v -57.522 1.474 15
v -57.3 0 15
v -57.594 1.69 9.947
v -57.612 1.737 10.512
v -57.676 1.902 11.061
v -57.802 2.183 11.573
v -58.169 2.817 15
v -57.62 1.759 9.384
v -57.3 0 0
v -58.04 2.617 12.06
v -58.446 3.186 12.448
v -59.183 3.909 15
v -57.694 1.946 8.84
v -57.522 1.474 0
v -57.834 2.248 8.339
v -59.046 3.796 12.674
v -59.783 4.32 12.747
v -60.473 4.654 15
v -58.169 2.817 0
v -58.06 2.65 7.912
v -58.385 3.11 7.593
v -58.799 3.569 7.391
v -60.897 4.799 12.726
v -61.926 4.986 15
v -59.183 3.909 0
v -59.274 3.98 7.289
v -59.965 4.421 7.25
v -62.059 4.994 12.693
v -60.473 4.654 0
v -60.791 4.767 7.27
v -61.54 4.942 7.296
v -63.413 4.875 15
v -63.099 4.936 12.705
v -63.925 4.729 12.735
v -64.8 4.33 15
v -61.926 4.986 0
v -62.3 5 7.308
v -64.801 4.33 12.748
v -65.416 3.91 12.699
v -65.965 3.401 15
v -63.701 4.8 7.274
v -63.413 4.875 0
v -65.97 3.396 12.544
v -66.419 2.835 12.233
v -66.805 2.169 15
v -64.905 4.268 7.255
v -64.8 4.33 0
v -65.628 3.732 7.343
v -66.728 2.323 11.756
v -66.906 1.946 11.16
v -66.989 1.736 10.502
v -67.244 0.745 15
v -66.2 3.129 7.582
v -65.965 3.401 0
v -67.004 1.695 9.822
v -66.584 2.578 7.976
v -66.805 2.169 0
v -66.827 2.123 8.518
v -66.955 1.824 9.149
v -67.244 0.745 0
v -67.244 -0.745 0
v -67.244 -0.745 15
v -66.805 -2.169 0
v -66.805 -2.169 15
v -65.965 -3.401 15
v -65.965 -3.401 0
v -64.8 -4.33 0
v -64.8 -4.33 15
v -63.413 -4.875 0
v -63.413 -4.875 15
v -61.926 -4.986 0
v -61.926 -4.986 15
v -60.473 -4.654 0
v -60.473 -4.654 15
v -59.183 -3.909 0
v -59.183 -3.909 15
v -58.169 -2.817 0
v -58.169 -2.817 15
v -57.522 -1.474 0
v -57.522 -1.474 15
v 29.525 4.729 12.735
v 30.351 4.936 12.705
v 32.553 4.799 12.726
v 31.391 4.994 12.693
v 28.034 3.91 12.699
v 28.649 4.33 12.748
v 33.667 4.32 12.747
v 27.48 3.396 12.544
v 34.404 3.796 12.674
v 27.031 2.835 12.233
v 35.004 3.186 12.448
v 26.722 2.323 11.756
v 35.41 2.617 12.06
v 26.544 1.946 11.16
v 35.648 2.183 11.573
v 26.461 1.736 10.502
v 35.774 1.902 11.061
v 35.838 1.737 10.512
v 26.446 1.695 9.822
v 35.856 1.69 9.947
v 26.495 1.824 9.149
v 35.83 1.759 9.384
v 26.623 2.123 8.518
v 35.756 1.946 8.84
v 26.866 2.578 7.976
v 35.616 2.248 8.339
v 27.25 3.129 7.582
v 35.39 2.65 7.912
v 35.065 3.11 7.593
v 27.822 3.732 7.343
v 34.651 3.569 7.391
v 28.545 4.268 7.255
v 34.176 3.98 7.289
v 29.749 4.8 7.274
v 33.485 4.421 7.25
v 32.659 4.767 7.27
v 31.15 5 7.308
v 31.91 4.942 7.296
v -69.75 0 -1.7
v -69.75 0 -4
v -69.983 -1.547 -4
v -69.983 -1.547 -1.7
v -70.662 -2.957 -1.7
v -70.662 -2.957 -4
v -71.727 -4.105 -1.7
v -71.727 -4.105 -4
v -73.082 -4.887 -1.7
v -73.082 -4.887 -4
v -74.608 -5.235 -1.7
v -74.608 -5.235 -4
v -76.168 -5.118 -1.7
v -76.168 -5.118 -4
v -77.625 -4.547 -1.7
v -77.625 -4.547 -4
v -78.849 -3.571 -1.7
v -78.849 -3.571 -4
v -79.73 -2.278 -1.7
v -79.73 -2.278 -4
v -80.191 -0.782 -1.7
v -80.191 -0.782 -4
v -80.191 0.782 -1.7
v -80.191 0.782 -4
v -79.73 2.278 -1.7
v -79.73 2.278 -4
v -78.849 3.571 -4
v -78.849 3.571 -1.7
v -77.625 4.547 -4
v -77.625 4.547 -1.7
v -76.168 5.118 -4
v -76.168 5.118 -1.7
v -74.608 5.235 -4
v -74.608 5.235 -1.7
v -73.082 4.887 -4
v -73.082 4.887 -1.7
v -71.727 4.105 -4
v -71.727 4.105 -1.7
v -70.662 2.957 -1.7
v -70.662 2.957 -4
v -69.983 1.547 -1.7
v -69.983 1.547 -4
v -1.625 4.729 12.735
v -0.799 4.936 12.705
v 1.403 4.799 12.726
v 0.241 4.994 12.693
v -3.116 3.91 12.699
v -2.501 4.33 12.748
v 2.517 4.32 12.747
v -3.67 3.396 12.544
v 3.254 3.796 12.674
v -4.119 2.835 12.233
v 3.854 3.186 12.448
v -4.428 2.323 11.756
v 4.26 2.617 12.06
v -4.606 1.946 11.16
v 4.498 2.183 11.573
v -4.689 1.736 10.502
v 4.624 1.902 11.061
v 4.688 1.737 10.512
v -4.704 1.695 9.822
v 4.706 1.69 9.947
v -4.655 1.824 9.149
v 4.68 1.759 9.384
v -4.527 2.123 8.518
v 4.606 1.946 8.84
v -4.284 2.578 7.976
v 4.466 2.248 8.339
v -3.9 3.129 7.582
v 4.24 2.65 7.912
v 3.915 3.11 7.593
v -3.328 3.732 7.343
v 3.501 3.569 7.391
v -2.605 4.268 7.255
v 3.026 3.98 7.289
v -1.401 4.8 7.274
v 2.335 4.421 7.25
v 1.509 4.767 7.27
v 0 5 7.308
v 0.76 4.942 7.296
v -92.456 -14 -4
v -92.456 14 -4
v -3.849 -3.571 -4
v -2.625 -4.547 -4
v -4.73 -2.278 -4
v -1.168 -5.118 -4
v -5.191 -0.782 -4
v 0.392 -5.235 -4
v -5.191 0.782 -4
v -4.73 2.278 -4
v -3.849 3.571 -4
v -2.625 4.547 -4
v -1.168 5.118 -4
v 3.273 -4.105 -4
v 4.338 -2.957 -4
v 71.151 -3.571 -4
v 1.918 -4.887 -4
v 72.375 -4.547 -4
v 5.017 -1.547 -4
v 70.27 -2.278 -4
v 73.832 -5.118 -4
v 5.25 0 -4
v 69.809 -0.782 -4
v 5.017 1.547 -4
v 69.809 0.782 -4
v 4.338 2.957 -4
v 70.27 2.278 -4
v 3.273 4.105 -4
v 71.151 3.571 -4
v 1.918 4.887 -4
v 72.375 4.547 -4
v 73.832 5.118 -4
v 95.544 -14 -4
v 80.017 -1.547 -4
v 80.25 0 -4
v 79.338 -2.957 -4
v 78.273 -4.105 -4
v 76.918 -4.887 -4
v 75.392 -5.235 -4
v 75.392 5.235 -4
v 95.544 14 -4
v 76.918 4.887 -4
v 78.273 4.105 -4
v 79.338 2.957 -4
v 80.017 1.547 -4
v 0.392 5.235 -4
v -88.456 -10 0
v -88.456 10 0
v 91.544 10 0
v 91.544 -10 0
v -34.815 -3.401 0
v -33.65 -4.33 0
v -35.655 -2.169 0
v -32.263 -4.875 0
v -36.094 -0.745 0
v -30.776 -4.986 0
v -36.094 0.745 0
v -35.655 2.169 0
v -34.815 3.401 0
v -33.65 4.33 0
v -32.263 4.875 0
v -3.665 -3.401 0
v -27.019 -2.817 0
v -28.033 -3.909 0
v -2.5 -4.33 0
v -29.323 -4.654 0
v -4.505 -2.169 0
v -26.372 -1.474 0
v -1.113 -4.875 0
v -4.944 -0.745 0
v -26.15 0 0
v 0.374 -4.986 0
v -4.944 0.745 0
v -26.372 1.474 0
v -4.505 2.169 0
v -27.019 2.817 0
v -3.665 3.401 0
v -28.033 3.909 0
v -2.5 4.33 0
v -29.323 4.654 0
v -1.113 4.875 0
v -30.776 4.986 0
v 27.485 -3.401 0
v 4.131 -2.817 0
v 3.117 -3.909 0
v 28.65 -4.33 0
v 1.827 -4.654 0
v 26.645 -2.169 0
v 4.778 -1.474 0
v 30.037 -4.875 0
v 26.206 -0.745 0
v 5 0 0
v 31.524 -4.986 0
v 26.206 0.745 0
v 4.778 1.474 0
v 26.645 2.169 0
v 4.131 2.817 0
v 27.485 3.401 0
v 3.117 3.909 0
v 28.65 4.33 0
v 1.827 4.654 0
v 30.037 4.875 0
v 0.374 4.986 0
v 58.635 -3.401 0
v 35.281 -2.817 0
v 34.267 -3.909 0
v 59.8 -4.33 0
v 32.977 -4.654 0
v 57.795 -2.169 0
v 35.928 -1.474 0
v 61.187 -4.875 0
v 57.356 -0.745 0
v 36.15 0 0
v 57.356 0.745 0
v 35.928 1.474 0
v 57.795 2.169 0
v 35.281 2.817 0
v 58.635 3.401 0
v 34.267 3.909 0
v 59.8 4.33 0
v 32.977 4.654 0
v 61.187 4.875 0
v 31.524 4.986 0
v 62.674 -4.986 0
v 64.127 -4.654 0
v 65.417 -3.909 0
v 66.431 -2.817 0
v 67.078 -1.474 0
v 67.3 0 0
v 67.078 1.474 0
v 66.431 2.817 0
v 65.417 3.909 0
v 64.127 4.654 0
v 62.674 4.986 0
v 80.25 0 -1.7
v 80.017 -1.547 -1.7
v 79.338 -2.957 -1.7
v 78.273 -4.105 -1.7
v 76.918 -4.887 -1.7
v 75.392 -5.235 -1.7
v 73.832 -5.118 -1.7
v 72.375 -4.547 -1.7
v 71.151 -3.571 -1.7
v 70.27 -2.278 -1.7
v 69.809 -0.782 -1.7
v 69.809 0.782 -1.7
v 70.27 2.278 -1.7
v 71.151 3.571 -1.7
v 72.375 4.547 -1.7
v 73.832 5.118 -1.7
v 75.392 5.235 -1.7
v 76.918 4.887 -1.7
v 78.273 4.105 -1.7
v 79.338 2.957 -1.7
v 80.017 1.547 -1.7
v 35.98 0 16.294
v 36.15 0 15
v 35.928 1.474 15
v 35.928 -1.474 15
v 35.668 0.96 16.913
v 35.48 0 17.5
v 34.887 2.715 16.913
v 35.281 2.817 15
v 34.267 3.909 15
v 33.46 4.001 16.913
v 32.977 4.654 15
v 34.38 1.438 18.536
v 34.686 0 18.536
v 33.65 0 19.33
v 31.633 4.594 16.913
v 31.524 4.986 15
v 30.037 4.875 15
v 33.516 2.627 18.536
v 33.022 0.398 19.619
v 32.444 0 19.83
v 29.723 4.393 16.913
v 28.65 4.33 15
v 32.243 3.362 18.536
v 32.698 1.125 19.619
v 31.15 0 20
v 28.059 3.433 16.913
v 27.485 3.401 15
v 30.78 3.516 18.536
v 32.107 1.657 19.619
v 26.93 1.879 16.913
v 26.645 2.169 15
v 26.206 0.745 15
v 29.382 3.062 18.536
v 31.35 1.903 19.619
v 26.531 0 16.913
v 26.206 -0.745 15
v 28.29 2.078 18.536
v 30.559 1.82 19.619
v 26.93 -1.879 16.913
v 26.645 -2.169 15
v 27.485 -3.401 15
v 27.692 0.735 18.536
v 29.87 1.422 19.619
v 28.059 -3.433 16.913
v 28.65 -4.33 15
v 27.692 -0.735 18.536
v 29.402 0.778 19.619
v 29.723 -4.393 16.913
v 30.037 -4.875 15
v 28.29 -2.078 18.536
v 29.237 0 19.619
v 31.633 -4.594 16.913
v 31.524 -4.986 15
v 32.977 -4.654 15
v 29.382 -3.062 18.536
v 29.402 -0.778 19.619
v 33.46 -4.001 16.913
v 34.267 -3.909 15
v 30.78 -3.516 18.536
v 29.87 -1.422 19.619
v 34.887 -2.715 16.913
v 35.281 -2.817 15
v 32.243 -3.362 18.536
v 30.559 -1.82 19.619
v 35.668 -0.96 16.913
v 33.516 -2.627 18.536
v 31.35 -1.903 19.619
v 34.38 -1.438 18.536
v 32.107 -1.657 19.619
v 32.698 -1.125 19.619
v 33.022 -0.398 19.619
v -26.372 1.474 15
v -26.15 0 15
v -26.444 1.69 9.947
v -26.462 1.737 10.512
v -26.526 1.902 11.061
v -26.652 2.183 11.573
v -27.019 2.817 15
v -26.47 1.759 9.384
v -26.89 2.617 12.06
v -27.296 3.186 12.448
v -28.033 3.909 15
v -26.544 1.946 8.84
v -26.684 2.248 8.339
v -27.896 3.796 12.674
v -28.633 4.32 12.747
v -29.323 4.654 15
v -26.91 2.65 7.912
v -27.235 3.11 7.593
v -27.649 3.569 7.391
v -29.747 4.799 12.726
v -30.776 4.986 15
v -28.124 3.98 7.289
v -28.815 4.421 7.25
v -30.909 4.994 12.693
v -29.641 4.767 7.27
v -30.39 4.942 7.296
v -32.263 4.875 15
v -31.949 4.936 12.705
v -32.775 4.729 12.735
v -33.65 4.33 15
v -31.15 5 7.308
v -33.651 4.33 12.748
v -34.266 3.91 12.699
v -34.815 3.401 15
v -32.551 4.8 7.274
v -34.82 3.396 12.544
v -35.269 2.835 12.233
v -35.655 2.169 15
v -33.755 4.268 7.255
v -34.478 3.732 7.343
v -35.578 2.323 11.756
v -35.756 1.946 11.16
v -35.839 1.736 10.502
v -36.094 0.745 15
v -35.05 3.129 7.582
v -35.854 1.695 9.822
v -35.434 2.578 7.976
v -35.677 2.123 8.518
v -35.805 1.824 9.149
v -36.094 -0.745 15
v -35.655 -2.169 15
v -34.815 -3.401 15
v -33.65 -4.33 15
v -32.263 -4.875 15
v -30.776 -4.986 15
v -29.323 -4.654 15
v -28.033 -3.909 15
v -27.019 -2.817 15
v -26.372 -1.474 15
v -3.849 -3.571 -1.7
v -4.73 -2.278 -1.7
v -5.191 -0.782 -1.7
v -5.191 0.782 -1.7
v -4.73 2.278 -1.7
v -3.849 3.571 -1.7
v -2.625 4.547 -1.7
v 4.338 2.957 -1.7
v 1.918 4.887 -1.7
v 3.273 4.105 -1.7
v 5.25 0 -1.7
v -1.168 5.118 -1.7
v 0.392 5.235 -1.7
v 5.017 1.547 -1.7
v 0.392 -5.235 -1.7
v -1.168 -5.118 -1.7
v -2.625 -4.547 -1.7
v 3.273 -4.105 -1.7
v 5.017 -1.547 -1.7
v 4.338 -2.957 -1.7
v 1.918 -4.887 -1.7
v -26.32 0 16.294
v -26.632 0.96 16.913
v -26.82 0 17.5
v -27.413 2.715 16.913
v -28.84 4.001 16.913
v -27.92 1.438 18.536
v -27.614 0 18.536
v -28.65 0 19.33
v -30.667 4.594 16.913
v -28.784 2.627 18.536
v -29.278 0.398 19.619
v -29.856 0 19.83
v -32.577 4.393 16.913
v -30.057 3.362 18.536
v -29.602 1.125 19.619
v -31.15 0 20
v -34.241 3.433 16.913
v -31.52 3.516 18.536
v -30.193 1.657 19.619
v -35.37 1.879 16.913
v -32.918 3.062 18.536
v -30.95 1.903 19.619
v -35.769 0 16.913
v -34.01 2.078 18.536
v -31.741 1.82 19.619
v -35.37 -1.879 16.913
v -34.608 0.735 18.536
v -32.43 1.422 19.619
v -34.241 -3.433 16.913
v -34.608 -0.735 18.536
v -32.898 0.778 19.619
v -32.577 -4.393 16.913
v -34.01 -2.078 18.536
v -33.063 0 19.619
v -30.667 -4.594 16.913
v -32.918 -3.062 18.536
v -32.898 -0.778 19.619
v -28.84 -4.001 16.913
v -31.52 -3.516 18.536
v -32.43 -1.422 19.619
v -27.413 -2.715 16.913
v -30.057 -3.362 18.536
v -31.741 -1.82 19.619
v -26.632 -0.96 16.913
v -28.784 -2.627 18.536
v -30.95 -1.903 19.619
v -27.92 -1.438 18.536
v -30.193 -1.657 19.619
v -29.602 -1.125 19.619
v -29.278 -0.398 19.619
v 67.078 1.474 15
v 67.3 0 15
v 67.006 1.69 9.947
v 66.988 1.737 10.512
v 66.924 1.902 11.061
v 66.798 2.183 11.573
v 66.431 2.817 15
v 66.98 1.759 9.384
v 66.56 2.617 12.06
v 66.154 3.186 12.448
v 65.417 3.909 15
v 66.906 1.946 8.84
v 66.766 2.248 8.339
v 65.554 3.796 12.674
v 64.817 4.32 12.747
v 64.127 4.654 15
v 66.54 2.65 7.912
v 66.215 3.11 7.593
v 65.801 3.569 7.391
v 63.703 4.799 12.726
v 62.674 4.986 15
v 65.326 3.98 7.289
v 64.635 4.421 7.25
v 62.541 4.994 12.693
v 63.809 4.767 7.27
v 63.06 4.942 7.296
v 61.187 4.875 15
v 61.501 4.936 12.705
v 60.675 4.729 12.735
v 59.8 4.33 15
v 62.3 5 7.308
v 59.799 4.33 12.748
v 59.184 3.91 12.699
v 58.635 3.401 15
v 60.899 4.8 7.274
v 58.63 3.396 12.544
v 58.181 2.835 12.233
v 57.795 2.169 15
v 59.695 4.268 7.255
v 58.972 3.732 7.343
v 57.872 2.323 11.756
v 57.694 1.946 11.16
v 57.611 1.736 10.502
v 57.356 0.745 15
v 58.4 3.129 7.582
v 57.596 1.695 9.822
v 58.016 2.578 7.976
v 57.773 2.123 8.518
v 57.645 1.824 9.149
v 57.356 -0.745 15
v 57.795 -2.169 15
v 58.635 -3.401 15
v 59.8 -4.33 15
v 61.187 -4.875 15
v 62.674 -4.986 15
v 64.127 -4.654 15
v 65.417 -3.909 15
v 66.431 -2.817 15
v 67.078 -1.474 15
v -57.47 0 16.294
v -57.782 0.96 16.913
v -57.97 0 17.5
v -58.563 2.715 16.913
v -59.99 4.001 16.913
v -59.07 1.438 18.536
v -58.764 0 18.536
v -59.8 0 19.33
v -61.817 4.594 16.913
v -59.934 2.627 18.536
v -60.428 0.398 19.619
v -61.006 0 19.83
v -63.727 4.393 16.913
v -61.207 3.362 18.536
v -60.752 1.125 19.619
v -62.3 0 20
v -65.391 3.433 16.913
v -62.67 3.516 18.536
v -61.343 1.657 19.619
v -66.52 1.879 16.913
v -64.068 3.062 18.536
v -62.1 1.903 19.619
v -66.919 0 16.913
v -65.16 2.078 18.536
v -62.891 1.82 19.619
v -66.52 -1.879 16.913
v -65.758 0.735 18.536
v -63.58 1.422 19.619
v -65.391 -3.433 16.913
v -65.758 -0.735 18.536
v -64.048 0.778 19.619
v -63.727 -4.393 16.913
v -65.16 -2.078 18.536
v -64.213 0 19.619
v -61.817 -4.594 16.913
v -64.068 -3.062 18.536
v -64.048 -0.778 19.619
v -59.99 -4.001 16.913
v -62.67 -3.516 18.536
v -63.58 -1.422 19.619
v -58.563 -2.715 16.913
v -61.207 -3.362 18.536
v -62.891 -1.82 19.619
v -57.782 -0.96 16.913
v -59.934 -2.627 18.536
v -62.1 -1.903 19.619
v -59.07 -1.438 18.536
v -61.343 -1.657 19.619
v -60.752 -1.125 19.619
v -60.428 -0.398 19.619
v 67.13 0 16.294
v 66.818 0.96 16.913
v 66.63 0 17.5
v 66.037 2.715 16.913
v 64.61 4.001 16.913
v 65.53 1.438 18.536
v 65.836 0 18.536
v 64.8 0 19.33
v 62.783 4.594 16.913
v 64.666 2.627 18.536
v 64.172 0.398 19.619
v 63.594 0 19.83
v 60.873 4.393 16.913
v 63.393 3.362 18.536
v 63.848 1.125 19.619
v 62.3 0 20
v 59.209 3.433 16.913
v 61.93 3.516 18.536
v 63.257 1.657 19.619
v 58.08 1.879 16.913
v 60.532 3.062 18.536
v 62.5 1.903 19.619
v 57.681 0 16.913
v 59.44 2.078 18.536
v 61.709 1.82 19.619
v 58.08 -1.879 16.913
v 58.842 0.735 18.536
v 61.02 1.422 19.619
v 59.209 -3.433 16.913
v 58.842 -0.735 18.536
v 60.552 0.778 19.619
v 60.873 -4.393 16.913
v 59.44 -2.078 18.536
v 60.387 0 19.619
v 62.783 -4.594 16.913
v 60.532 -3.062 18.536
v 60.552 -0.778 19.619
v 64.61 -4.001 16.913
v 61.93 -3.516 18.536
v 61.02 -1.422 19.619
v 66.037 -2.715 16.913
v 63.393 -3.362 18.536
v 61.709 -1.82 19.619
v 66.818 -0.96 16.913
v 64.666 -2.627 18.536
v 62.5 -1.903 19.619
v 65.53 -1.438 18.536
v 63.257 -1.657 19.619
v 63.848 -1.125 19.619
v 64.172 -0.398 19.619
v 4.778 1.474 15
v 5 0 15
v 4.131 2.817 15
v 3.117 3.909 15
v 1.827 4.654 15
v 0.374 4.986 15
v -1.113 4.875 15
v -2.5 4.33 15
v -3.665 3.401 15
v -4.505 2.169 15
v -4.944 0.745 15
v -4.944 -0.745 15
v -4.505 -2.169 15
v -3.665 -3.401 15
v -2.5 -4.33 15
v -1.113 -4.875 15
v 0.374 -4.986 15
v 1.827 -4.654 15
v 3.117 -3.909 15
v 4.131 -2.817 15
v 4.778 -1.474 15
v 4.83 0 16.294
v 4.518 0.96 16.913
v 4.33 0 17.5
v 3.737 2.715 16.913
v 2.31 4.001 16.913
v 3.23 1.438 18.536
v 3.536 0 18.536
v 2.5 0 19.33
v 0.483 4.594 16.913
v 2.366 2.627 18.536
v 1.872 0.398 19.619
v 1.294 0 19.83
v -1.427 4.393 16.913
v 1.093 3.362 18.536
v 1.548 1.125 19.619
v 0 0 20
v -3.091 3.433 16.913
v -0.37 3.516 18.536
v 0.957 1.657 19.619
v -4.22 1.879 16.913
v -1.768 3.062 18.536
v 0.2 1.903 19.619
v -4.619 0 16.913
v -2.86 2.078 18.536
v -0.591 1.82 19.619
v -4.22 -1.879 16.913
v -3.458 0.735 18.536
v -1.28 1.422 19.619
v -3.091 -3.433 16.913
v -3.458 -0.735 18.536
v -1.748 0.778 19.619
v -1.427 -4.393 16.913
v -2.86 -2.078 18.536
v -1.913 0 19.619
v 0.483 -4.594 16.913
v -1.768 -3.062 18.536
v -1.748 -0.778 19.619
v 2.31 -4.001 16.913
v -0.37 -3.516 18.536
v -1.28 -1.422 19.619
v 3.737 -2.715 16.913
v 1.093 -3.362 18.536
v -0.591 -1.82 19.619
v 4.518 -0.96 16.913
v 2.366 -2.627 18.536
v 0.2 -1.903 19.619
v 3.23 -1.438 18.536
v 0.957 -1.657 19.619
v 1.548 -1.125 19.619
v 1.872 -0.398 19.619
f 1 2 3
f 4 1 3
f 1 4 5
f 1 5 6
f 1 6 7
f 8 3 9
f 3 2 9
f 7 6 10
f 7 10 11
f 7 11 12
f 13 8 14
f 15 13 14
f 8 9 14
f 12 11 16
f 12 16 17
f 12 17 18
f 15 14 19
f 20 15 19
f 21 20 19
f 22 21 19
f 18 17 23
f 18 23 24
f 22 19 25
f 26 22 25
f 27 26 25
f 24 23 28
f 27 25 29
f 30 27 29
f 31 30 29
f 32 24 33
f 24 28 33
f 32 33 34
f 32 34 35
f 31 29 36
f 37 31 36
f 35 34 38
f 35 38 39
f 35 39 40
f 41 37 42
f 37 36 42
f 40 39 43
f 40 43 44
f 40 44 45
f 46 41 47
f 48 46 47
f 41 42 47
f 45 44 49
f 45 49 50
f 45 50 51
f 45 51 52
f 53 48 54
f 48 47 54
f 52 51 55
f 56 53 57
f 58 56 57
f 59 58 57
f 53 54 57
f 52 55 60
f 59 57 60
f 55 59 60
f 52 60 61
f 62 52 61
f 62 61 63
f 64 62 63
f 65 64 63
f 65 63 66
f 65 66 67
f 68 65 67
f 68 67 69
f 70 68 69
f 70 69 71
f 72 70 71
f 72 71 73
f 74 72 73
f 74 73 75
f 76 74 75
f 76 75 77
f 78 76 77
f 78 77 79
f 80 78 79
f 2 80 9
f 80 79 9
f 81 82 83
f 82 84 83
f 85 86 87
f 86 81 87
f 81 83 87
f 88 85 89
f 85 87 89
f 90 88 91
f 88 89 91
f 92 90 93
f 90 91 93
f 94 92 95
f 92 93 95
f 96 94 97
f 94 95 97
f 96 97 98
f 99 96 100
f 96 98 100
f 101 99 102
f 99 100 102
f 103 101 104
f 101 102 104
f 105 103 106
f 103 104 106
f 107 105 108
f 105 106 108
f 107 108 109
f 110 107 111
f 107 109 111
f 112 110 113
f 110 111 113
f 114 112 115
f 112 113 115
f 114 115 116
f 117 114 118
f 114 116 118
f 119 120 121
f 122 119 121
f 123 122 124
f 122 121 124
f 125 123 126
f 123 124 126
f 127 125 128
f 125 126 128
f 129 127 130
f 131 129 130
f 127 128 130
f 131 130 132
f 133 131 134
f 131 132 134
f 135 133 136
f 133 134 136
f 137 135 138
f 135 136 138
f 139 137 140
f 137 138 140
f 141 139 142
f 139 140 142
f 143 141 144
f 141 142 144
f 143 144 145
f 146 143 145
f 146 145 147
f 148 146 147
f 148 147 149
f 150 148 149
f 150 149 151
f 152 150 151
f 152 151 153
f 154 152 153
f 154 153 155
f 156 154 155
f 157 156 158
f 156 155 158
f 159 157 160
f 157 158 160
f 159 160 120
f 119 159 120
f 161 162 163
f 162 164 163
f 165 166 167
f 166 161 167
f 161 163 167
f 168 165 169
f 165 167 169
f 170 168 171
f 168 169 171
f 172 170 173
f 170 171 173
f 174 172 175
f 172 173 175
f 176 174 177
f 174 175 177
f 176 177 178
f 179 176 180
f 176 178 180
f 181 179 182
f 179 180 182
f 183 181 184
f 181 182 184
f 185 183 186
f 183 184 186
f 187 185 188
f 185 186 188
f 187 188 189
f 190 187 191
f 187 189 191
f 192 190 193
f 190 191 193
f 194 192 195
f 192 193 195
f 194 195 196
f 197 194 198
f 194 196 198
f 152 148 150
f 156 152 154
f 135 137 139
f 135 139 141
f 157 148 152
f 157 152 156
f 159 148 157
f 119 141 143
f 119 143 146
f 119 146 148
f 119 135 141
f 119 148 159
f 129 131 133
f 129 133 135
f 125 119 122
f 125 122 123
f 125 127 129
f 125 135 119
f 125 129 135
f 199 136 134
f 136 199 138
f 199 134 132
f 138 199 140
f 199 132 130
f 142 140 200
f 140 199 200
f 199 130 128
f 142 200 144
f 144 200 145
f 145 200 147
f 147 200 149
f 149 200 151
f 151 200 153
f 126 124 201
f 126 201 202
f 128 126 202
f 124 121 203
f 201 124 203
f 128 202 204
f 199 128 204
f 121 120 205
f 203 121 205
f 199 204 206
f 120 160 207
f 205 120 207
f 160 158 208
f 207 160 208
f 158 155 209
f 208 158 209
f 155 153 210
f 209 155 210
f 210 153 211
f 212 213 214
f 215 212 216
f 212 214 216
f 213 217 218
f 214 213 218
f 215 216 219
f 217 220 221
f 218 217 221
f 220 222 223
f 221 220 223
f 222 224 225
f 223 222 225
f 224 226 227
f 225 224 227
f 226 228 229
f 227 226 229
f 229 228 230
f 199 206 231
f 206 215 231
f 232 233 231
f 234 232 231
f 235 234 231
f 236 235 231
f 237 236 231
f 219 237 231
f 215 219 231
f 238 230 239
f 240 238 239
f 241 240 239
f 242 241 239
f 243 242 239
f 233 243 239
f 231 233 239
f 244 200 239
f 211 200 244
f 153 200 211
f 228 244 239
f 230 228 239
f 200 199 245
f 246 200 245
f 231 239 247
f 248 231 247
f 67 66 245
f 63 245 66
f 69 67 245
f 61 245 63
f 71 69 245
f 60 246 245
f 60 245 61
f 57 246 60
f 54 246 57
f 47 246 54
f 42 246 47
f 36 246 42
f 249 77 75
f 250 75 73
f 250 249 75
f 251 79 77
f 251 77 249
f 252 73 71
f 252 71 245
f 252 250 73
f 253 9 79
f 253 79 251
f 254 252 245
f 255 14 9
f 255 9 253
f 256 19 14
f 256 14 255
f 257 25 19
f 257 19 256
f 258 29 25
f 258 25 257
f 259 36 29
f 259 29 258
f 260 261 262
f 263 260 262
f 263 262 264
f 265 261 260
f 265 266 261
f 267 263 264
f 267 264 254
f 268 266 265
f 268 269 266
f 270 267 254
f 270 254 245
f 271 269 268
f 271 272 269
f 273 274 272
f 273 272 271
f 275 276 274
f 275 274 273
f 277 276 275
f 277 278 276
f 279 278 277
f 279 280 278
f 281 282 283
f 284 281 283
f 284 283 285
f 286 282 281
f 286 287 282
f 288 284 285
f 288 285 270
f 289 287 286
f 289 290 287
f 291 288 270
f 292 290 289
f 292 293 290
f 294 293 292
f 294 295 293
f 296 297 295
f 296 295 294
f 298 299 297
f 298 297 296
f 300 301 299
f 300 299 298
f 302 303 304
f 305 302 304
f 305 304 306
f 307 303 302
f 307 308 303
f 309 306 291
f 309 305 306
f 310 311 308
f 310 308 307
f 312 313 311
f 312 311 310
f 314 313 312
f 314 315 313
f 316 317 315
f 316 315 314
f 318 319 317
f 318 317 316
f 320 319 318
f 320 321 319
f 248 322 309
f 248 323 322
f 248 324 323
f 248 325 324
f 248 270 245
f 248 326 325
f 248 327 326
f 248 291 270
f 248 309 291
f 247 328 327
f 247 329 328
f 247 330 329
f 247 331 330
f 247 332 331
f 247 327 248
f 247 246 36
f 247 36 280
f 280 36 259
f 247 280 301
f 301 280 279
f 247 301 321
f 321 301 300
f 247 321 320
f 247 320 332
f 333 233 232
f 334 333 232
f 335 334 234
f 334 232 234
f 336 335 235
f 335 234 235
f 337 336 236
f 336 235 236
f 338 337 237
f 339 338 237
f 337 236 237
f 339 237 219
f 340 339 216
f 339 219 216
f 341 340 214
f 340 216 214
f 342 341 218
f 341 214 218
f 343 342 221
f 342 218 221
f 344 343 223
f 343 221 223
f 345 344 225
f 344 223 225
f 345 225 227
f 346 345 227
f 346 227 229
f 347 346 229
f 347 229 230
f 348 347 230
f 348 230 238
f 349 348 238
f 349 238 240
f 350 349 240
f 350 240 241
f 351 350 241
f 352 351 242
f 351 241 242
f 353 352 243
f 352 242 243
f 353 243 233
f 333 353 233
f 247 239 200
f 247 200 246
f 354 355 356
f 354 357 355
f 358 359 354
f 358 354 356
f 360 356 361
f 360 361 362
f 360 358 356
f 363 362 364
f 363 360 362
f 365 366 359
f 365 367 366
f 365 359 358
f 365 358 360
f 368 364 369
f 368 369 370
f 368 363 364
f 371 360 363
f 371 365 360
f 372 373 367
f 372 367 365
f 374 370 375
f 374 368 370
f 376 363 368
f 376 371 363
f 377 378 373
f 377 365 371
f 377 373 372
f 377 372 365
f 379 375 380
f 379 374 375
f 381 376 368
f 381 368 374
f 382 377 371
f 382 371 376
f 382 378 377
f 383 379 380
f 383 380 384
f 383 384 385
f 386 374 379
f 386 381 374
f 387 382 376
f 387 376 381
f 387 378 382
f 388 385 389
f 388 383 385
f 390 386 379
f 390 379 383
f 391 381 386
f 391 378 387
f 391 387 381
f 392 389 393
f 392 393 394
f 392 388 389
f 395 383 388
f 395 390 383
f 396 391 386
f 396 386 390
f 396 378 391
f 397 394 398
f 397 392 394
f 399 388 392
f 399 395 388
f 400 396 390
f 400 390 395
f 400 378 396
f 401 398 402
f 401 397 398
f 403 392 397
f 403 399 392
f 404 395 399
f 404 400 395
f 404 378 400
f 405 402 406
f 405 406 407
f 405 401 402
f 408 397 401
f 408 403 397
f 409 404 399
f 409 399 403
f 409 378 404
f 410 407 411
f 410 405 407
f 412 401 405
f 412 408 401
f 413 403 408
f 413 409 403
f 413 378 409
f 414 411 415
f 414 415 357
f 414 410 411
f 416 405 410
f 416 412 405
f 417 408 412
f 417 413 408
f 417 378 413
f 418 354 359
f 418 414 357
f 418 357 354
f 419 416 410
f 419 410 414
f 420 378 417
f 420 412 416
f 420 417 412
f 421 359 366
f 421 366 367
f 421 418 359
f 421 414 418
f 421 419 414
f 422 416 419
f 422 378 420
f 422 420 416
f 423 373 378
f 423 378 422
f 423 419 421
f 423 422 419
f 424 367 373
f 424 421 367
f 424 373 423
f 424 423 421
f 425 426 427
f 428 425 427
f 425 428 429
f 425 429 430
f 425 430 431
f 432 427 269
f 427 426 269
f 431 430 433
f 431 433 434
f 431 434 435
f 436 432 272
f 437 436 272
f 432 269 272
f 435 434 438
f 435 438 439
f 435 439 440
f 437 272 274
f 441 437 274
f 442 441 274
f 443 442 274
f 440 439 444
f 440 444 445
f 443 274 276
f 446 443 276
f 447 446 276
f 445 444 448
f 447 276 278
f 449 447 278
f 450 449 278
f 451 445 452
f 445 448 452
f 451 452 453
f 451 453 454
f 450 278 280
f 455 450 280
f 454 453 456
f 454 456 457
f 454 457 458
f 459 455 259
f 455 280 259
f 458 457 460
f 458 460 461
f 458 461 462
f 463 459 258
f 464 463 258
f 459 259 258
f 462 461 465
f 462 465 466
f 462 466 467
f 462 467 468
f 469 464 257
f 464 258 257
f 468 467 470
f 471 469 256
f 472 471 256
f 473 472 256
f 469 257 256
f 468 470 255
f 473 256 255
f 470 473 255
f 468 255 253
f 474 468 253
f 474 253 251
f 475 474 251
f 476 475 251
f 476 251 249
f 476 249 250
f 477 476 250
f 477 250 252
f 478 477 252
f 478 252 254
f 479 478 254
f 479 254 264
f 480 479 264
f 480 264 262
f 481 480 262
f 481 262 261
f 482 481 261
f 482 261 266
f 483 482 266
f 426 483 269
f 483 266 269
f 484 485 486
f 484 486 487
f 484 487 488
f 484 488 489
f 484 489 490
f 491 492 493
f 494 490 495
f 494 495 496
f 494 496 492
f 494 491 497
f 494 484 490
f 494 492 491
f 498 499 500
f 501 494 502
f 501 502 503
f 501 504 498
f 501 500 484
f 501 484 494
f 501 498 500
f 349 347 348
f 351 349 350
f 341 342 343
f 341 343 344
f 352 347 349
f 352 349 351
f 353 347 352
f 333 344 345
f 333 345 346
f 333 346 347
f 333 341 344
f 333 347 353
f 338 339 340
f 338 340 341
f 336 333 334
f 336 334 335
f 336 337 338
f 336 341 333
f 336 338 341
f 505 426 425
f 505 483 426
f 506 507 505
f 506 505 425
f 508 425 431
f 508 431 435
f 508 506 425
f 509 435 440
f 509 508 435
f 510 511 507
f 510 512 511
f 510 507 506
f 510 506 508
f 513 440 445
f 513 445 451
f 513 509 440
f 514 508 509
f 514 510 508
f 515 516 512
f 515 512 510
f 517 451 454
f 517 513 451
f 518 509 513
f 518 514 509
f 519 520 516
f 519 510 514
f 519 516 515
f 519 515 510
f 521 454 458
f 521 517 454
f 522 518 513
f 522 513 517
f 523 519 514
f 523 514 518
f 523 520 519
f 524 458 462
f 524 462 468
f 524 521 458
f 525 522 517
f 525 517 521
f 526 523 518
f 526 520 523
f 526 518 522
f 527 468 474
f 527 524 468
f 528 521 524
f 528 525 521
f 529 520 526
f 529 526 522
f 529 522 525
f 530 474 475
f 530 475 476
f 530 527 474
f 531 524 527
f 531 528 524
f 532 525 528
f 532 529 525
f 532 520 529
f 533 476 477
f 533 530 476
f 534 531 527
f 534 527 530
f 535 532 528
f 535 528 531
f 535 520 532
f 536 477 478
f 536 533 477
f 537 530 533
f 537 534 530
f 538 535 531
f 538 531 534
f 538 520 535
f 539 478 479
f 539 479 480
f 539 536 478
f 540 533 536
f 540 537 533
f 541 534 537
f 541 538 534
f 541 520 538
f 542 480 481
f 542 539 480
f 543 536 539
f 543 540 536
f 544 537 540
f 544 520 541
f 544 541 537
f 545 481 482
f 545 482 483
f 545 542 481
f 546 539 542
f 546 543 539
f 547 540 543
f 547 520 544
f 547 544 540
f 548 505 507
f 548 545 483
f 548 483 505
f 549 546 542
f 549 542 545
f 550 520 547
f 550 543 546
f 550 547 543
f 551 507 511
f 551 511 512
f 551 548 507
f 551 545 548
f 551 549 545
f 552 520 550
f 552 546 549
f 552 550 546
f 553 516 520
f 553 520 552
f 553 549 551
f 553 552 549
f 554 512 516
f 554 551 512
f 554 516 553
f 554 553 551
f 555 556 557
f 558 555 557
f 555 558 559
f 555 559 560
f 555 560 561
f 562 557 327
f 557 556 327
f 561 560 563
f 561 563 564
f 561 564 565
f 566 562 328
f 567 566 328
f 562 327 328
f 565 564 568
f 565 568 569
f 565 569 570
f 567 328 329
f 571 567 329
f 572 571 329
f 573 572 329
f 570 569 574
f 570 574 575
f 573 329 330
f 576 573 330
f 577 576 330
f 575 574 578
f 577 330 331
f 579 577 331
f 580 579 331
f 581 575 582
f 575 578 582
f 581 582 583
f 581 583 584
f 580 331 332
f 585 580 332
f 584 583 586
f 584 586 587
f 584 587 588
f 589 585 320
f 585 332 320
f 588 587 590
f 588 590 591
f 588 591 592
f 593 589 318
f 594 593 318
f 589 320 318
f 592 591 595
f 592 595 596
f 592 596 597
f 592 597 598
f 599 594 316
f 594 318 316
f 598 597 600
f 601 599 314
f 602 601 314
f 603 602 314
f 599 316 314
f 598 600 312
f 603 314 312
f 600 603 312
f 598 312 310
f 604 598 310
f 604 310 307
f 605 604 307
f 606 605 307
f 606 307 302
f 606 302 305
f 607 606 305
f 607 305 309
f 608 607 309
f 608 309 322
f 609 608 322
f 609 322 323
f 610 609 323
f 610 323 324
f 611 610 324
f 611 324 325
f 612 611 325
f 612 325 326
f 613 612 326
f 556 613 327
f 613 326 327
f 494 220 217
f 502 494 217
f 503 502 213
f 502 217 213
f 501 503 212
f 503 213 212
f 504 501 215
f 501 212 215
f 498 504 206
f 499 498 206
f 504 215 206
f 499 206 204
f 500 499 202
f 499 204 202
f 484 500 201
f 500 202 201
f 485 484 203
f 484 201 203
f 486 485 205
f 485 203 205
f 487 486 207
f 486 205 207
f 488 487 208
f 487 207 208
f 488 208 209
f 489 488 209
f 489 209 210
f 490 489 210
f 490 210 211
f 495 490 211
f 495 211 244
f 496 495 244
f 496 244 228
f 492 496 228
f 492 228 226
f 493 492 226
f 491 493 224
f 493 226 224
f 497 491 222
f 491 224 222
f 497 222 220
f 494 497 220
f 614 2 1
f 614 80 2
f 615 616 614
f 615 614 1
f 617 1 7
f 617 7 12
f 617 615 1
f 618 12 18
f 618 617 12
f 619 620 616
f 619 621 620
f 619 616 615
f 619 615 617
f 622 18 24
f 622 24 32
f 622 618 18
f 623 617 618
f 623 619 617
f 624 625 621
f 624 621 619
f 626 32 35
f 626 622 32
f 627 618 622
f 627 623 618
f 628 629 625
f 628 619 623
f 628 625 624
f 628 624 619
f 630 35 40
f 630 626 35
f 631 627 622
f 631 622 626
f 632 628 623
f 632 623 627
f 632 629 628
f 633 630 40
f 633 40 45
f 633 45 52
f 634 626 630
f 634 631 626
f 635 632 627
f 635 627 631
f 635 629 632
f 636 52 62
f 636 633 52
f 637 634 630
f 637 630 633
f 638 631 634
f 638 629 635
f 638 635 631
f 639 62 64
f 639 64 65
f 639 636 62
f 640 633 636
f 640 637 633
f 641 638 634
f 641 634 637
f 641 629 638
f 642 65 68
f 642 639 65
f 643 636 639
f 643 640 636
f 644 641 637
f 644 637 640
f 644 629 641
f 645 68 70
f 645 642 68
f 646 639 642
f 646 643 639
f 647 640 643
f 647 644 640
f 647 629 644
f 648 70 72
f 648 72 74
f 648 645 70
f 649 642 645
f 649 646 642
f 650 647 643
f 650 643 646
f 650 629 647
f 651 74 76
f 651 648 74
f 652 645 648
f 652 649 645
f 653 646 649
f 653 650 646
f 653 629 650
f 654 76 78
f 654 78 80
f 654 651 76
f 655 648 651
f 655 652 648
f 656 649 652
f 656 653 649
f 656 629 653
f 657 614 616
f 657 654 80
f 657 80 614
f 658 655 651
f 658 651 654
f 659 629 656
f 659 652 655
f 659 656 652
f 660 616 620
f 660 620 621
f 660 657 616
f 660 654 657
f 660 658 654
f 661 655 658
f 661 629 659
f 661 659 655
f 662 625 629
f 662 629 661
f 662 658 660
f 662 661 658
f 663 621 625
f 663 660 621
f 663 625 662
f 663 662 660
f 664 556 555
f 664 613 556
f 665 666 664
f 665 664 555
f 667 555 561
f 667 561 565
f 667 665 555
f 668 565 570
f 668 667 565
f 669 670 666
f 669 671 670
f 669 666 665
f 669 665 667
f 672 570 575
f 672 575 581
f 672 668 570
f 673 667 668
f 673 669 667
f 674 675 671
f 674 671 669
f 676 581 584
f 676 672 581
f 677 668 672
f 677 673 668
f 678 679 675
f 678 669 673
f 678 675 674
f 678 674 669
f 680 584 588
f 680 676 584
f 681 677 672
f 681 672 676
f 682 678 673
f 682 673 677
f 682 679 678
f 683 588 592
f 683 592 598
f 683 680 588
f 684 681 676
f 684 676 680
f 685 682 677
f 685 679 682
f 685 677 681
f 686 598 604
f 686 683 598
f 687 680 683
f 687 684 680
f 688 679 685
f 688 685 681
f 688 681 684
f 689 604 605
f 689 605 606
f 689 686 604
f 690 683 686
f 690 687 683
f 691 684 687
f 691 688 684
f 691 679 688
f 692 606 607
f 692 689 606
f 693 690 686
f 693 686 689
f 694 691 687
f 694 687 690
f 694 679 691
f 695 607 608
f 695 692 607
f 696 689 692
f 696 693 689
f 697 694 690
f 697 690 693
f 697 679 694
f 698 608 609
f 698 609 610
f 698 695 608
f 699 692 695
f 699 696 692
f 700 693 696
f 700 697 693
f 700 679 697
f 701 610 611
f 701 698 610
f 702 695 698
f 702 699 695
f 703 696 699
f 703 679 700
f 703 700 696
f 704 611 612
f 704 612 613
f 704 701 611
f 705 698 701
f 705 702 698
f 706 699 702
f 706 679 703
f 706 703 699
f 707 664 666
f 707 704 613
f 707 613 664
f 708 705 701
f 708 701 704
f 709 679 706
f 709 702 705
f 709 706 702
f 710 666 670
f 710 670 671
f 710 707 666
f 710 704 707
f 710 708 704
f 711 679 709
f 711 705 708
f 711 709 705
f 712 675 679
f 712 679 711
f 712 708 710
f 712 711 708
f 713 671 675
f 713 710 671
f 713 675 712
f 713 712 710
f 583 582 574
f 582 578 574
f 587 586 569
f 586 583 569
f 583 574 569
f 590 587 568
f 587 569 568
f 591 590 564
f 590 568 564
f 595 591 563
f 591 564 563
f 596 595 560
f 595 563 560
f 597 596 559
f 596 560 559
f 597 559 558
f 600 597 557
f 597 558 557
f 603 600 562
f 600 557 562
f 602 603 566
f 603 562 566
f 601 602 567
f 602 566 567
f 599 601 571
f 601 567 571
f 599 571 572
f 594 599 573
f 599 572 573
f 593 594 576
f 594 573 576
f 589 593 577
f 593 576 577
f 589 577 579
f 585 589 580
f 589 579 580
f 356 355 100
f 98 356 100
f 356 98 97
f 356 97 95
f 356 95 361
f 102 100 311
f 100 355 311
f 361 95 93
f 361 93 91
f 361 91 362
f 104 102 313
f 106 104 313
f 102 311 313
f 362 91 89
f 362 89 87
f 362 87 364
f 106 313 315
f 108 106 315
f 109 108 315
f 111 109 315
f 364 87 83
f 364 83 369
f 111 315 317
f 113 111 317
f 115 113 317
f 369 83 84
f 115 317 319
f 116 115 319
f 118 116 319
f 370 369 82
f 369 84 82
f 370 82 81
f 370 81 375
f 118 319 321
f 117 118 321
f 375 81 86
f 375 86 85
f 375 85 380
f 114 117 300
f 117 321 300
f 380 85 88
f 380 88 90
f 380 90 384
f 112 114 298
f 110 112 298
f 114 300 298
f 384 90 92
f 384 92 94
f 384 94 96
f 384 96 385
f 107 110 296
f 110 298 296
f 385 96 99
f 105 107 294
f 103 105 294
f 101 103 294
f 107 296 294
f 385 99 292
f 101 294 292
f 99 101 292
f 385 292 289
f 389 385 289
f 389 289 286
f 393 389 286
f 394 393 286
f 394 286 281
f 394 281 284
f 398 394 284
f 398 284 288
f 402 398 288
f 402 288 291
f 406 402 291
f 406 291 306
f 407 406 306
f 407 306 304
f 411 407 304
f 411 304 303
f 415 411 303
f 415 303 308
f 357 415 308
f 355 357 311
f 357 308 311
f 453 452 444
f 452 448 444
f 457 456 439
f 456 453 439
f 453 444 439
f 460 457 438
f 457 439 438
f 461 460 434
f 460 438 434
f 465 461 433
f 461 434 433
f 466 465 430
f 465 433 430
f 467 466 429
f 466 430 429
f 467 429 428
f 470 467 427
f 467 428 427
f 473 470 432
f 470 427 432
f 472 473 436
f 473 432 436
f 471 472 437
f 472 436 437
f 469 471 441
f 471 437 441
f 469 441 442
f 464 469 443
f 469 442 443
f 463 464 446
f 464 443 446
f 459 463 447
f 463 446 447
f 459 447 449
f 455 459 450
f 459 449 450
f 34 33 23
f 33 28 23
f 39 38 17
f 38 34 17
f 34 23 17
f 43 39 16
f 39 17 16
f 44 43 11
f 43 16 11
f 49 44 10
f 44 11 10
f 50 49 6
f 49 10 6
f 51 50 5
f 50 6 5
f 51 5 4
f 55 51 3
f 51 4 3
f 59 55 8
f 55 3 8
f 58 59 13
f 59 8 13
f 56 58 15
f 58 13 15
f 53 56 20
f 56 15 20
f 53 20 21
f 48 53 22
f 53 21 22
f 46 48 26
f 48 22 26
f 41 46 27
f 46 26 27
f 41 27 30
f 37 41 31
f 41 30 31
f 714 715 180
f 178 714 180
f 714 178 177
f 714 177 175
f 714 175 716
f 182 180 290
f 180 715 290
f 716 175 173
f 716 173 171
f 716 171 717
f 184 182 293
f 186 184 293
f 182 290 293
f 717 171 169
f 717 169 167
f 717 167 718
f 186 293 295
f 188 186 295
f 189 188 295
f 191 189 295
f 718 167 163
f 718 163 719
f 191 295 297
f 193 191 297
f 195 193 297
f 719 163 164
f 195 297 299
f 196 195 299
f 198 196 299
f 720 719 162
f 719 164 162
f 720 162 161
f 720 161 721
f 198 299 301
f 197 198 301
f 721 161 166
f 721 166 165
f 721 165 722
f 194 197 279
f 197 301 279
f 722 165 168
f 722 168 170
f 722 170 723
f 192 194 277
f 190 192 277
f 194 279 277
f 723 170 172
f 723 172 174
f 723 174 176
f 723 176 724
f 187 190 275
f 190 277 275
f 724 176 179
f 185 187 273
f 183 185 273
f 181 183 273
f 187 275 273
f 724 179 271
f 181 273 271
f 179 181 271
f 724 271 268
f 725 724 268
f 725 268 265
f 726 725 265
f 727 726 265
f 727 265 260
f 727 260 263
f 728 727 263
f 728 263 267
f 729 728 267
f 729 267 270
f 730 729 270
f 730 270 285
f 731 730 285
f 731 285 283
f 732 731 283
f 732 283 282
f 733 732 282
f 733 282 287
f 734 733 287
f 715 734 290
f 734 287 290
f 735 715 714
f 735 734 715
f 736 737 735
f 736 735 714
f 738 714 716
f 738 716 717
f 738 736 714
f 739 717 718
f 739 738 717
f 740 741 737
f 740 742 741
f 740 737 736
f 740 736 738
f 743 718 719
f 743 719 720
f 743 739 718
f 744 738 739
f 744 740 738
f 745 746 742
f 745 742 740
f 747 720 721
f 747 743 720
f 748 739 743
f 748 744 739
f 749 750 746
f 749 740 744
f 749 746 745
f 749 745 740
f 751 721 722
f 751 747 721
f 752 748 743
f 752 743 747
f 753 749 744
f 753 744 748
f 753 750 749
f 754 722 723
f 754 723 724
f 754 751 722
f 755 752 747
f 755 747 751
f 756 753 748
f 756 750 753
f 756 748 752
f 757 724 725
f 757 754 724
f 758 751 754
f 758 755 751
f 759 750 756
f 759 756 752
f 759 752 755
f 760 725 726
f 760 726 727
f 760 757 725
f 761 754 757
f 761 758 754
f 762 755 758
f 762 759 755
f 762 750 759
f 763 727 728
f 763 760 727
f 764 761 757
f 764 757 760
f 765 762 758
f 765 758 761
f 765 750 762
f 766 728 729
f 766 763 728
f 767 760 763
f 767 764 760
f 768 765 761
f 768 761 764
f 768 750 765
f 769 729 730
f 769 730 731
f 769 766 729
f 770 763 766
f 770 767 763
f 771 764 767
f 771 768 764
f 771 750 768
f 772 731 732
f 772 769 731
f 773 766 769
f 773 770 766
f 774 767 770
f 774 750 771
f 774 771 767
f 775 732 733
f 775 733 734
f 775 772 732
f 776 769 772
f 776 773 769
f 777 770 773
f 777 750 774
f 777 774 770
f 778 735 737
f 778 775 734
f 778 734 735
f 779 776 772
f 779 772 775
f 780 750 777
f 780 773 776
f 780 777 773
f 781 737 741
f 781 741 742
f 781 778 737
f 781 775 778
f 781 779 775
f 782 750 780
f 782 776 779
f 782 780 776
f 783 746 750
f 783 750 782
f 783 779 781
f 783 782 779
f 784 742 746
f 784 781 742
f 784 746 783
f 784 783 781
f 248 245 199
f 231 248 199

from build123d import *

# Parameters (mm, degrees)
F0_W        = 190
F0_H        = 30
F1_DEPTH    = 4
F2_R        = 5
F3_DEPTH    = 20
F4_R        = 5.25
F5_DEPTH    = 2.3
F6_T1_DEPTH = 215.7168298797
F6_T3_DEPTH = 55.7168298797
F7_R        = 2.75
F8_DEPTH    = 75
F9_R        = 5


# Not quite as in the source:
# - a fillet or chamfer that OpenCascade refuses, or shapes differently, is made with other operations: its cross-section is extruded or revolved along the edge and cut away or added


with BuildPart() as f1:
    # F0 (on Top) → F1 (new body)
    with BuildSketch(Plane.XY):
        with Locations((1.5441179276, 0)):
            Rectangle(F0_W, F0_H)
    extrude(amount=-F1_DEPTH)

    # F2 (on Top) → F3 (join)
    with BuildSketch(Plane.XY):
        with Locations((-62.3, 0)):
            Circle(F2_R)
        with Locations((-31.15, 0)):
            Circle(F2_R)
        Circle(F2_R)
        with Locations((31.15, 0)):
            Circle(F2_R)
        with Locations((62.3, 0)):
            Circle(F2_R)
    extrude(amount=F3_DEPTH)

    # F4 (on face) → F5 (cut)
    with BuildSketch(Plane(origin=(0, 0, -4), x_dir=(1, 0, 0), z_dir=(0, 0, -1))):
        with Locations((-75, 0)):
            Circle(F4_R)
        Circle(F4_R)
        with Locations((75, 0)):
            Circle(F4_R)
    extrude(amount=-F5_DEPTH, mode=Mode.SUBTRACT)

    # F6: chamfer of 5 on 4 edges, made by hand

    # F6_s2 → F6_t1 (cut)
    with BuildSketch(Plane.YZ.offset(-106.3142970123)):
        Polygon((15, -5), (10, 0), (15, 0), align=None)
        Polygon((-10, 0), (-15, -5), (-15, 0), align=None)
    extrude(amount=F6_T1_DEPTH, mode=Mode.SUBTRACT)

    # F6_s4 → F6_t3 (cut)
    with BuildSketch(Plane.XZ.offset(-27.8584149398)):
        Polygon((96.5441179276, -5), (91.5441179276, 0), (96.5441179276, 0), align=None)
        Polygon((-93.4558820724, -5), (-88.4558820724, 0), (-93.4558820724, 0), align=None)
    extrude(amount=F6_T3_DEPTH, mode=Mode.SUBTRACT)

    # F7 (on Right) → F8 (cut, symmetric)
    with BuildSketch(Plane.YZ):
        with Locations((4.4393371791, 10)):
            Circle(F7_R)
    extrude(amount=F8_DEPTH, both=True, mode=Mode.SUBTRACT)

    # F9
    f9_edges = [f1.edges().sort_by_distance(p)[0] for p in [
        (-67.3, 0, 20),
        (-36.15, 0, 20),
        (-5, 0, 20),
        (26.15, 0, 20),
        (57.3, 0, 20),
    ]]
    fillet(f9_edges, radius=F9_R)


solid = f1.part
